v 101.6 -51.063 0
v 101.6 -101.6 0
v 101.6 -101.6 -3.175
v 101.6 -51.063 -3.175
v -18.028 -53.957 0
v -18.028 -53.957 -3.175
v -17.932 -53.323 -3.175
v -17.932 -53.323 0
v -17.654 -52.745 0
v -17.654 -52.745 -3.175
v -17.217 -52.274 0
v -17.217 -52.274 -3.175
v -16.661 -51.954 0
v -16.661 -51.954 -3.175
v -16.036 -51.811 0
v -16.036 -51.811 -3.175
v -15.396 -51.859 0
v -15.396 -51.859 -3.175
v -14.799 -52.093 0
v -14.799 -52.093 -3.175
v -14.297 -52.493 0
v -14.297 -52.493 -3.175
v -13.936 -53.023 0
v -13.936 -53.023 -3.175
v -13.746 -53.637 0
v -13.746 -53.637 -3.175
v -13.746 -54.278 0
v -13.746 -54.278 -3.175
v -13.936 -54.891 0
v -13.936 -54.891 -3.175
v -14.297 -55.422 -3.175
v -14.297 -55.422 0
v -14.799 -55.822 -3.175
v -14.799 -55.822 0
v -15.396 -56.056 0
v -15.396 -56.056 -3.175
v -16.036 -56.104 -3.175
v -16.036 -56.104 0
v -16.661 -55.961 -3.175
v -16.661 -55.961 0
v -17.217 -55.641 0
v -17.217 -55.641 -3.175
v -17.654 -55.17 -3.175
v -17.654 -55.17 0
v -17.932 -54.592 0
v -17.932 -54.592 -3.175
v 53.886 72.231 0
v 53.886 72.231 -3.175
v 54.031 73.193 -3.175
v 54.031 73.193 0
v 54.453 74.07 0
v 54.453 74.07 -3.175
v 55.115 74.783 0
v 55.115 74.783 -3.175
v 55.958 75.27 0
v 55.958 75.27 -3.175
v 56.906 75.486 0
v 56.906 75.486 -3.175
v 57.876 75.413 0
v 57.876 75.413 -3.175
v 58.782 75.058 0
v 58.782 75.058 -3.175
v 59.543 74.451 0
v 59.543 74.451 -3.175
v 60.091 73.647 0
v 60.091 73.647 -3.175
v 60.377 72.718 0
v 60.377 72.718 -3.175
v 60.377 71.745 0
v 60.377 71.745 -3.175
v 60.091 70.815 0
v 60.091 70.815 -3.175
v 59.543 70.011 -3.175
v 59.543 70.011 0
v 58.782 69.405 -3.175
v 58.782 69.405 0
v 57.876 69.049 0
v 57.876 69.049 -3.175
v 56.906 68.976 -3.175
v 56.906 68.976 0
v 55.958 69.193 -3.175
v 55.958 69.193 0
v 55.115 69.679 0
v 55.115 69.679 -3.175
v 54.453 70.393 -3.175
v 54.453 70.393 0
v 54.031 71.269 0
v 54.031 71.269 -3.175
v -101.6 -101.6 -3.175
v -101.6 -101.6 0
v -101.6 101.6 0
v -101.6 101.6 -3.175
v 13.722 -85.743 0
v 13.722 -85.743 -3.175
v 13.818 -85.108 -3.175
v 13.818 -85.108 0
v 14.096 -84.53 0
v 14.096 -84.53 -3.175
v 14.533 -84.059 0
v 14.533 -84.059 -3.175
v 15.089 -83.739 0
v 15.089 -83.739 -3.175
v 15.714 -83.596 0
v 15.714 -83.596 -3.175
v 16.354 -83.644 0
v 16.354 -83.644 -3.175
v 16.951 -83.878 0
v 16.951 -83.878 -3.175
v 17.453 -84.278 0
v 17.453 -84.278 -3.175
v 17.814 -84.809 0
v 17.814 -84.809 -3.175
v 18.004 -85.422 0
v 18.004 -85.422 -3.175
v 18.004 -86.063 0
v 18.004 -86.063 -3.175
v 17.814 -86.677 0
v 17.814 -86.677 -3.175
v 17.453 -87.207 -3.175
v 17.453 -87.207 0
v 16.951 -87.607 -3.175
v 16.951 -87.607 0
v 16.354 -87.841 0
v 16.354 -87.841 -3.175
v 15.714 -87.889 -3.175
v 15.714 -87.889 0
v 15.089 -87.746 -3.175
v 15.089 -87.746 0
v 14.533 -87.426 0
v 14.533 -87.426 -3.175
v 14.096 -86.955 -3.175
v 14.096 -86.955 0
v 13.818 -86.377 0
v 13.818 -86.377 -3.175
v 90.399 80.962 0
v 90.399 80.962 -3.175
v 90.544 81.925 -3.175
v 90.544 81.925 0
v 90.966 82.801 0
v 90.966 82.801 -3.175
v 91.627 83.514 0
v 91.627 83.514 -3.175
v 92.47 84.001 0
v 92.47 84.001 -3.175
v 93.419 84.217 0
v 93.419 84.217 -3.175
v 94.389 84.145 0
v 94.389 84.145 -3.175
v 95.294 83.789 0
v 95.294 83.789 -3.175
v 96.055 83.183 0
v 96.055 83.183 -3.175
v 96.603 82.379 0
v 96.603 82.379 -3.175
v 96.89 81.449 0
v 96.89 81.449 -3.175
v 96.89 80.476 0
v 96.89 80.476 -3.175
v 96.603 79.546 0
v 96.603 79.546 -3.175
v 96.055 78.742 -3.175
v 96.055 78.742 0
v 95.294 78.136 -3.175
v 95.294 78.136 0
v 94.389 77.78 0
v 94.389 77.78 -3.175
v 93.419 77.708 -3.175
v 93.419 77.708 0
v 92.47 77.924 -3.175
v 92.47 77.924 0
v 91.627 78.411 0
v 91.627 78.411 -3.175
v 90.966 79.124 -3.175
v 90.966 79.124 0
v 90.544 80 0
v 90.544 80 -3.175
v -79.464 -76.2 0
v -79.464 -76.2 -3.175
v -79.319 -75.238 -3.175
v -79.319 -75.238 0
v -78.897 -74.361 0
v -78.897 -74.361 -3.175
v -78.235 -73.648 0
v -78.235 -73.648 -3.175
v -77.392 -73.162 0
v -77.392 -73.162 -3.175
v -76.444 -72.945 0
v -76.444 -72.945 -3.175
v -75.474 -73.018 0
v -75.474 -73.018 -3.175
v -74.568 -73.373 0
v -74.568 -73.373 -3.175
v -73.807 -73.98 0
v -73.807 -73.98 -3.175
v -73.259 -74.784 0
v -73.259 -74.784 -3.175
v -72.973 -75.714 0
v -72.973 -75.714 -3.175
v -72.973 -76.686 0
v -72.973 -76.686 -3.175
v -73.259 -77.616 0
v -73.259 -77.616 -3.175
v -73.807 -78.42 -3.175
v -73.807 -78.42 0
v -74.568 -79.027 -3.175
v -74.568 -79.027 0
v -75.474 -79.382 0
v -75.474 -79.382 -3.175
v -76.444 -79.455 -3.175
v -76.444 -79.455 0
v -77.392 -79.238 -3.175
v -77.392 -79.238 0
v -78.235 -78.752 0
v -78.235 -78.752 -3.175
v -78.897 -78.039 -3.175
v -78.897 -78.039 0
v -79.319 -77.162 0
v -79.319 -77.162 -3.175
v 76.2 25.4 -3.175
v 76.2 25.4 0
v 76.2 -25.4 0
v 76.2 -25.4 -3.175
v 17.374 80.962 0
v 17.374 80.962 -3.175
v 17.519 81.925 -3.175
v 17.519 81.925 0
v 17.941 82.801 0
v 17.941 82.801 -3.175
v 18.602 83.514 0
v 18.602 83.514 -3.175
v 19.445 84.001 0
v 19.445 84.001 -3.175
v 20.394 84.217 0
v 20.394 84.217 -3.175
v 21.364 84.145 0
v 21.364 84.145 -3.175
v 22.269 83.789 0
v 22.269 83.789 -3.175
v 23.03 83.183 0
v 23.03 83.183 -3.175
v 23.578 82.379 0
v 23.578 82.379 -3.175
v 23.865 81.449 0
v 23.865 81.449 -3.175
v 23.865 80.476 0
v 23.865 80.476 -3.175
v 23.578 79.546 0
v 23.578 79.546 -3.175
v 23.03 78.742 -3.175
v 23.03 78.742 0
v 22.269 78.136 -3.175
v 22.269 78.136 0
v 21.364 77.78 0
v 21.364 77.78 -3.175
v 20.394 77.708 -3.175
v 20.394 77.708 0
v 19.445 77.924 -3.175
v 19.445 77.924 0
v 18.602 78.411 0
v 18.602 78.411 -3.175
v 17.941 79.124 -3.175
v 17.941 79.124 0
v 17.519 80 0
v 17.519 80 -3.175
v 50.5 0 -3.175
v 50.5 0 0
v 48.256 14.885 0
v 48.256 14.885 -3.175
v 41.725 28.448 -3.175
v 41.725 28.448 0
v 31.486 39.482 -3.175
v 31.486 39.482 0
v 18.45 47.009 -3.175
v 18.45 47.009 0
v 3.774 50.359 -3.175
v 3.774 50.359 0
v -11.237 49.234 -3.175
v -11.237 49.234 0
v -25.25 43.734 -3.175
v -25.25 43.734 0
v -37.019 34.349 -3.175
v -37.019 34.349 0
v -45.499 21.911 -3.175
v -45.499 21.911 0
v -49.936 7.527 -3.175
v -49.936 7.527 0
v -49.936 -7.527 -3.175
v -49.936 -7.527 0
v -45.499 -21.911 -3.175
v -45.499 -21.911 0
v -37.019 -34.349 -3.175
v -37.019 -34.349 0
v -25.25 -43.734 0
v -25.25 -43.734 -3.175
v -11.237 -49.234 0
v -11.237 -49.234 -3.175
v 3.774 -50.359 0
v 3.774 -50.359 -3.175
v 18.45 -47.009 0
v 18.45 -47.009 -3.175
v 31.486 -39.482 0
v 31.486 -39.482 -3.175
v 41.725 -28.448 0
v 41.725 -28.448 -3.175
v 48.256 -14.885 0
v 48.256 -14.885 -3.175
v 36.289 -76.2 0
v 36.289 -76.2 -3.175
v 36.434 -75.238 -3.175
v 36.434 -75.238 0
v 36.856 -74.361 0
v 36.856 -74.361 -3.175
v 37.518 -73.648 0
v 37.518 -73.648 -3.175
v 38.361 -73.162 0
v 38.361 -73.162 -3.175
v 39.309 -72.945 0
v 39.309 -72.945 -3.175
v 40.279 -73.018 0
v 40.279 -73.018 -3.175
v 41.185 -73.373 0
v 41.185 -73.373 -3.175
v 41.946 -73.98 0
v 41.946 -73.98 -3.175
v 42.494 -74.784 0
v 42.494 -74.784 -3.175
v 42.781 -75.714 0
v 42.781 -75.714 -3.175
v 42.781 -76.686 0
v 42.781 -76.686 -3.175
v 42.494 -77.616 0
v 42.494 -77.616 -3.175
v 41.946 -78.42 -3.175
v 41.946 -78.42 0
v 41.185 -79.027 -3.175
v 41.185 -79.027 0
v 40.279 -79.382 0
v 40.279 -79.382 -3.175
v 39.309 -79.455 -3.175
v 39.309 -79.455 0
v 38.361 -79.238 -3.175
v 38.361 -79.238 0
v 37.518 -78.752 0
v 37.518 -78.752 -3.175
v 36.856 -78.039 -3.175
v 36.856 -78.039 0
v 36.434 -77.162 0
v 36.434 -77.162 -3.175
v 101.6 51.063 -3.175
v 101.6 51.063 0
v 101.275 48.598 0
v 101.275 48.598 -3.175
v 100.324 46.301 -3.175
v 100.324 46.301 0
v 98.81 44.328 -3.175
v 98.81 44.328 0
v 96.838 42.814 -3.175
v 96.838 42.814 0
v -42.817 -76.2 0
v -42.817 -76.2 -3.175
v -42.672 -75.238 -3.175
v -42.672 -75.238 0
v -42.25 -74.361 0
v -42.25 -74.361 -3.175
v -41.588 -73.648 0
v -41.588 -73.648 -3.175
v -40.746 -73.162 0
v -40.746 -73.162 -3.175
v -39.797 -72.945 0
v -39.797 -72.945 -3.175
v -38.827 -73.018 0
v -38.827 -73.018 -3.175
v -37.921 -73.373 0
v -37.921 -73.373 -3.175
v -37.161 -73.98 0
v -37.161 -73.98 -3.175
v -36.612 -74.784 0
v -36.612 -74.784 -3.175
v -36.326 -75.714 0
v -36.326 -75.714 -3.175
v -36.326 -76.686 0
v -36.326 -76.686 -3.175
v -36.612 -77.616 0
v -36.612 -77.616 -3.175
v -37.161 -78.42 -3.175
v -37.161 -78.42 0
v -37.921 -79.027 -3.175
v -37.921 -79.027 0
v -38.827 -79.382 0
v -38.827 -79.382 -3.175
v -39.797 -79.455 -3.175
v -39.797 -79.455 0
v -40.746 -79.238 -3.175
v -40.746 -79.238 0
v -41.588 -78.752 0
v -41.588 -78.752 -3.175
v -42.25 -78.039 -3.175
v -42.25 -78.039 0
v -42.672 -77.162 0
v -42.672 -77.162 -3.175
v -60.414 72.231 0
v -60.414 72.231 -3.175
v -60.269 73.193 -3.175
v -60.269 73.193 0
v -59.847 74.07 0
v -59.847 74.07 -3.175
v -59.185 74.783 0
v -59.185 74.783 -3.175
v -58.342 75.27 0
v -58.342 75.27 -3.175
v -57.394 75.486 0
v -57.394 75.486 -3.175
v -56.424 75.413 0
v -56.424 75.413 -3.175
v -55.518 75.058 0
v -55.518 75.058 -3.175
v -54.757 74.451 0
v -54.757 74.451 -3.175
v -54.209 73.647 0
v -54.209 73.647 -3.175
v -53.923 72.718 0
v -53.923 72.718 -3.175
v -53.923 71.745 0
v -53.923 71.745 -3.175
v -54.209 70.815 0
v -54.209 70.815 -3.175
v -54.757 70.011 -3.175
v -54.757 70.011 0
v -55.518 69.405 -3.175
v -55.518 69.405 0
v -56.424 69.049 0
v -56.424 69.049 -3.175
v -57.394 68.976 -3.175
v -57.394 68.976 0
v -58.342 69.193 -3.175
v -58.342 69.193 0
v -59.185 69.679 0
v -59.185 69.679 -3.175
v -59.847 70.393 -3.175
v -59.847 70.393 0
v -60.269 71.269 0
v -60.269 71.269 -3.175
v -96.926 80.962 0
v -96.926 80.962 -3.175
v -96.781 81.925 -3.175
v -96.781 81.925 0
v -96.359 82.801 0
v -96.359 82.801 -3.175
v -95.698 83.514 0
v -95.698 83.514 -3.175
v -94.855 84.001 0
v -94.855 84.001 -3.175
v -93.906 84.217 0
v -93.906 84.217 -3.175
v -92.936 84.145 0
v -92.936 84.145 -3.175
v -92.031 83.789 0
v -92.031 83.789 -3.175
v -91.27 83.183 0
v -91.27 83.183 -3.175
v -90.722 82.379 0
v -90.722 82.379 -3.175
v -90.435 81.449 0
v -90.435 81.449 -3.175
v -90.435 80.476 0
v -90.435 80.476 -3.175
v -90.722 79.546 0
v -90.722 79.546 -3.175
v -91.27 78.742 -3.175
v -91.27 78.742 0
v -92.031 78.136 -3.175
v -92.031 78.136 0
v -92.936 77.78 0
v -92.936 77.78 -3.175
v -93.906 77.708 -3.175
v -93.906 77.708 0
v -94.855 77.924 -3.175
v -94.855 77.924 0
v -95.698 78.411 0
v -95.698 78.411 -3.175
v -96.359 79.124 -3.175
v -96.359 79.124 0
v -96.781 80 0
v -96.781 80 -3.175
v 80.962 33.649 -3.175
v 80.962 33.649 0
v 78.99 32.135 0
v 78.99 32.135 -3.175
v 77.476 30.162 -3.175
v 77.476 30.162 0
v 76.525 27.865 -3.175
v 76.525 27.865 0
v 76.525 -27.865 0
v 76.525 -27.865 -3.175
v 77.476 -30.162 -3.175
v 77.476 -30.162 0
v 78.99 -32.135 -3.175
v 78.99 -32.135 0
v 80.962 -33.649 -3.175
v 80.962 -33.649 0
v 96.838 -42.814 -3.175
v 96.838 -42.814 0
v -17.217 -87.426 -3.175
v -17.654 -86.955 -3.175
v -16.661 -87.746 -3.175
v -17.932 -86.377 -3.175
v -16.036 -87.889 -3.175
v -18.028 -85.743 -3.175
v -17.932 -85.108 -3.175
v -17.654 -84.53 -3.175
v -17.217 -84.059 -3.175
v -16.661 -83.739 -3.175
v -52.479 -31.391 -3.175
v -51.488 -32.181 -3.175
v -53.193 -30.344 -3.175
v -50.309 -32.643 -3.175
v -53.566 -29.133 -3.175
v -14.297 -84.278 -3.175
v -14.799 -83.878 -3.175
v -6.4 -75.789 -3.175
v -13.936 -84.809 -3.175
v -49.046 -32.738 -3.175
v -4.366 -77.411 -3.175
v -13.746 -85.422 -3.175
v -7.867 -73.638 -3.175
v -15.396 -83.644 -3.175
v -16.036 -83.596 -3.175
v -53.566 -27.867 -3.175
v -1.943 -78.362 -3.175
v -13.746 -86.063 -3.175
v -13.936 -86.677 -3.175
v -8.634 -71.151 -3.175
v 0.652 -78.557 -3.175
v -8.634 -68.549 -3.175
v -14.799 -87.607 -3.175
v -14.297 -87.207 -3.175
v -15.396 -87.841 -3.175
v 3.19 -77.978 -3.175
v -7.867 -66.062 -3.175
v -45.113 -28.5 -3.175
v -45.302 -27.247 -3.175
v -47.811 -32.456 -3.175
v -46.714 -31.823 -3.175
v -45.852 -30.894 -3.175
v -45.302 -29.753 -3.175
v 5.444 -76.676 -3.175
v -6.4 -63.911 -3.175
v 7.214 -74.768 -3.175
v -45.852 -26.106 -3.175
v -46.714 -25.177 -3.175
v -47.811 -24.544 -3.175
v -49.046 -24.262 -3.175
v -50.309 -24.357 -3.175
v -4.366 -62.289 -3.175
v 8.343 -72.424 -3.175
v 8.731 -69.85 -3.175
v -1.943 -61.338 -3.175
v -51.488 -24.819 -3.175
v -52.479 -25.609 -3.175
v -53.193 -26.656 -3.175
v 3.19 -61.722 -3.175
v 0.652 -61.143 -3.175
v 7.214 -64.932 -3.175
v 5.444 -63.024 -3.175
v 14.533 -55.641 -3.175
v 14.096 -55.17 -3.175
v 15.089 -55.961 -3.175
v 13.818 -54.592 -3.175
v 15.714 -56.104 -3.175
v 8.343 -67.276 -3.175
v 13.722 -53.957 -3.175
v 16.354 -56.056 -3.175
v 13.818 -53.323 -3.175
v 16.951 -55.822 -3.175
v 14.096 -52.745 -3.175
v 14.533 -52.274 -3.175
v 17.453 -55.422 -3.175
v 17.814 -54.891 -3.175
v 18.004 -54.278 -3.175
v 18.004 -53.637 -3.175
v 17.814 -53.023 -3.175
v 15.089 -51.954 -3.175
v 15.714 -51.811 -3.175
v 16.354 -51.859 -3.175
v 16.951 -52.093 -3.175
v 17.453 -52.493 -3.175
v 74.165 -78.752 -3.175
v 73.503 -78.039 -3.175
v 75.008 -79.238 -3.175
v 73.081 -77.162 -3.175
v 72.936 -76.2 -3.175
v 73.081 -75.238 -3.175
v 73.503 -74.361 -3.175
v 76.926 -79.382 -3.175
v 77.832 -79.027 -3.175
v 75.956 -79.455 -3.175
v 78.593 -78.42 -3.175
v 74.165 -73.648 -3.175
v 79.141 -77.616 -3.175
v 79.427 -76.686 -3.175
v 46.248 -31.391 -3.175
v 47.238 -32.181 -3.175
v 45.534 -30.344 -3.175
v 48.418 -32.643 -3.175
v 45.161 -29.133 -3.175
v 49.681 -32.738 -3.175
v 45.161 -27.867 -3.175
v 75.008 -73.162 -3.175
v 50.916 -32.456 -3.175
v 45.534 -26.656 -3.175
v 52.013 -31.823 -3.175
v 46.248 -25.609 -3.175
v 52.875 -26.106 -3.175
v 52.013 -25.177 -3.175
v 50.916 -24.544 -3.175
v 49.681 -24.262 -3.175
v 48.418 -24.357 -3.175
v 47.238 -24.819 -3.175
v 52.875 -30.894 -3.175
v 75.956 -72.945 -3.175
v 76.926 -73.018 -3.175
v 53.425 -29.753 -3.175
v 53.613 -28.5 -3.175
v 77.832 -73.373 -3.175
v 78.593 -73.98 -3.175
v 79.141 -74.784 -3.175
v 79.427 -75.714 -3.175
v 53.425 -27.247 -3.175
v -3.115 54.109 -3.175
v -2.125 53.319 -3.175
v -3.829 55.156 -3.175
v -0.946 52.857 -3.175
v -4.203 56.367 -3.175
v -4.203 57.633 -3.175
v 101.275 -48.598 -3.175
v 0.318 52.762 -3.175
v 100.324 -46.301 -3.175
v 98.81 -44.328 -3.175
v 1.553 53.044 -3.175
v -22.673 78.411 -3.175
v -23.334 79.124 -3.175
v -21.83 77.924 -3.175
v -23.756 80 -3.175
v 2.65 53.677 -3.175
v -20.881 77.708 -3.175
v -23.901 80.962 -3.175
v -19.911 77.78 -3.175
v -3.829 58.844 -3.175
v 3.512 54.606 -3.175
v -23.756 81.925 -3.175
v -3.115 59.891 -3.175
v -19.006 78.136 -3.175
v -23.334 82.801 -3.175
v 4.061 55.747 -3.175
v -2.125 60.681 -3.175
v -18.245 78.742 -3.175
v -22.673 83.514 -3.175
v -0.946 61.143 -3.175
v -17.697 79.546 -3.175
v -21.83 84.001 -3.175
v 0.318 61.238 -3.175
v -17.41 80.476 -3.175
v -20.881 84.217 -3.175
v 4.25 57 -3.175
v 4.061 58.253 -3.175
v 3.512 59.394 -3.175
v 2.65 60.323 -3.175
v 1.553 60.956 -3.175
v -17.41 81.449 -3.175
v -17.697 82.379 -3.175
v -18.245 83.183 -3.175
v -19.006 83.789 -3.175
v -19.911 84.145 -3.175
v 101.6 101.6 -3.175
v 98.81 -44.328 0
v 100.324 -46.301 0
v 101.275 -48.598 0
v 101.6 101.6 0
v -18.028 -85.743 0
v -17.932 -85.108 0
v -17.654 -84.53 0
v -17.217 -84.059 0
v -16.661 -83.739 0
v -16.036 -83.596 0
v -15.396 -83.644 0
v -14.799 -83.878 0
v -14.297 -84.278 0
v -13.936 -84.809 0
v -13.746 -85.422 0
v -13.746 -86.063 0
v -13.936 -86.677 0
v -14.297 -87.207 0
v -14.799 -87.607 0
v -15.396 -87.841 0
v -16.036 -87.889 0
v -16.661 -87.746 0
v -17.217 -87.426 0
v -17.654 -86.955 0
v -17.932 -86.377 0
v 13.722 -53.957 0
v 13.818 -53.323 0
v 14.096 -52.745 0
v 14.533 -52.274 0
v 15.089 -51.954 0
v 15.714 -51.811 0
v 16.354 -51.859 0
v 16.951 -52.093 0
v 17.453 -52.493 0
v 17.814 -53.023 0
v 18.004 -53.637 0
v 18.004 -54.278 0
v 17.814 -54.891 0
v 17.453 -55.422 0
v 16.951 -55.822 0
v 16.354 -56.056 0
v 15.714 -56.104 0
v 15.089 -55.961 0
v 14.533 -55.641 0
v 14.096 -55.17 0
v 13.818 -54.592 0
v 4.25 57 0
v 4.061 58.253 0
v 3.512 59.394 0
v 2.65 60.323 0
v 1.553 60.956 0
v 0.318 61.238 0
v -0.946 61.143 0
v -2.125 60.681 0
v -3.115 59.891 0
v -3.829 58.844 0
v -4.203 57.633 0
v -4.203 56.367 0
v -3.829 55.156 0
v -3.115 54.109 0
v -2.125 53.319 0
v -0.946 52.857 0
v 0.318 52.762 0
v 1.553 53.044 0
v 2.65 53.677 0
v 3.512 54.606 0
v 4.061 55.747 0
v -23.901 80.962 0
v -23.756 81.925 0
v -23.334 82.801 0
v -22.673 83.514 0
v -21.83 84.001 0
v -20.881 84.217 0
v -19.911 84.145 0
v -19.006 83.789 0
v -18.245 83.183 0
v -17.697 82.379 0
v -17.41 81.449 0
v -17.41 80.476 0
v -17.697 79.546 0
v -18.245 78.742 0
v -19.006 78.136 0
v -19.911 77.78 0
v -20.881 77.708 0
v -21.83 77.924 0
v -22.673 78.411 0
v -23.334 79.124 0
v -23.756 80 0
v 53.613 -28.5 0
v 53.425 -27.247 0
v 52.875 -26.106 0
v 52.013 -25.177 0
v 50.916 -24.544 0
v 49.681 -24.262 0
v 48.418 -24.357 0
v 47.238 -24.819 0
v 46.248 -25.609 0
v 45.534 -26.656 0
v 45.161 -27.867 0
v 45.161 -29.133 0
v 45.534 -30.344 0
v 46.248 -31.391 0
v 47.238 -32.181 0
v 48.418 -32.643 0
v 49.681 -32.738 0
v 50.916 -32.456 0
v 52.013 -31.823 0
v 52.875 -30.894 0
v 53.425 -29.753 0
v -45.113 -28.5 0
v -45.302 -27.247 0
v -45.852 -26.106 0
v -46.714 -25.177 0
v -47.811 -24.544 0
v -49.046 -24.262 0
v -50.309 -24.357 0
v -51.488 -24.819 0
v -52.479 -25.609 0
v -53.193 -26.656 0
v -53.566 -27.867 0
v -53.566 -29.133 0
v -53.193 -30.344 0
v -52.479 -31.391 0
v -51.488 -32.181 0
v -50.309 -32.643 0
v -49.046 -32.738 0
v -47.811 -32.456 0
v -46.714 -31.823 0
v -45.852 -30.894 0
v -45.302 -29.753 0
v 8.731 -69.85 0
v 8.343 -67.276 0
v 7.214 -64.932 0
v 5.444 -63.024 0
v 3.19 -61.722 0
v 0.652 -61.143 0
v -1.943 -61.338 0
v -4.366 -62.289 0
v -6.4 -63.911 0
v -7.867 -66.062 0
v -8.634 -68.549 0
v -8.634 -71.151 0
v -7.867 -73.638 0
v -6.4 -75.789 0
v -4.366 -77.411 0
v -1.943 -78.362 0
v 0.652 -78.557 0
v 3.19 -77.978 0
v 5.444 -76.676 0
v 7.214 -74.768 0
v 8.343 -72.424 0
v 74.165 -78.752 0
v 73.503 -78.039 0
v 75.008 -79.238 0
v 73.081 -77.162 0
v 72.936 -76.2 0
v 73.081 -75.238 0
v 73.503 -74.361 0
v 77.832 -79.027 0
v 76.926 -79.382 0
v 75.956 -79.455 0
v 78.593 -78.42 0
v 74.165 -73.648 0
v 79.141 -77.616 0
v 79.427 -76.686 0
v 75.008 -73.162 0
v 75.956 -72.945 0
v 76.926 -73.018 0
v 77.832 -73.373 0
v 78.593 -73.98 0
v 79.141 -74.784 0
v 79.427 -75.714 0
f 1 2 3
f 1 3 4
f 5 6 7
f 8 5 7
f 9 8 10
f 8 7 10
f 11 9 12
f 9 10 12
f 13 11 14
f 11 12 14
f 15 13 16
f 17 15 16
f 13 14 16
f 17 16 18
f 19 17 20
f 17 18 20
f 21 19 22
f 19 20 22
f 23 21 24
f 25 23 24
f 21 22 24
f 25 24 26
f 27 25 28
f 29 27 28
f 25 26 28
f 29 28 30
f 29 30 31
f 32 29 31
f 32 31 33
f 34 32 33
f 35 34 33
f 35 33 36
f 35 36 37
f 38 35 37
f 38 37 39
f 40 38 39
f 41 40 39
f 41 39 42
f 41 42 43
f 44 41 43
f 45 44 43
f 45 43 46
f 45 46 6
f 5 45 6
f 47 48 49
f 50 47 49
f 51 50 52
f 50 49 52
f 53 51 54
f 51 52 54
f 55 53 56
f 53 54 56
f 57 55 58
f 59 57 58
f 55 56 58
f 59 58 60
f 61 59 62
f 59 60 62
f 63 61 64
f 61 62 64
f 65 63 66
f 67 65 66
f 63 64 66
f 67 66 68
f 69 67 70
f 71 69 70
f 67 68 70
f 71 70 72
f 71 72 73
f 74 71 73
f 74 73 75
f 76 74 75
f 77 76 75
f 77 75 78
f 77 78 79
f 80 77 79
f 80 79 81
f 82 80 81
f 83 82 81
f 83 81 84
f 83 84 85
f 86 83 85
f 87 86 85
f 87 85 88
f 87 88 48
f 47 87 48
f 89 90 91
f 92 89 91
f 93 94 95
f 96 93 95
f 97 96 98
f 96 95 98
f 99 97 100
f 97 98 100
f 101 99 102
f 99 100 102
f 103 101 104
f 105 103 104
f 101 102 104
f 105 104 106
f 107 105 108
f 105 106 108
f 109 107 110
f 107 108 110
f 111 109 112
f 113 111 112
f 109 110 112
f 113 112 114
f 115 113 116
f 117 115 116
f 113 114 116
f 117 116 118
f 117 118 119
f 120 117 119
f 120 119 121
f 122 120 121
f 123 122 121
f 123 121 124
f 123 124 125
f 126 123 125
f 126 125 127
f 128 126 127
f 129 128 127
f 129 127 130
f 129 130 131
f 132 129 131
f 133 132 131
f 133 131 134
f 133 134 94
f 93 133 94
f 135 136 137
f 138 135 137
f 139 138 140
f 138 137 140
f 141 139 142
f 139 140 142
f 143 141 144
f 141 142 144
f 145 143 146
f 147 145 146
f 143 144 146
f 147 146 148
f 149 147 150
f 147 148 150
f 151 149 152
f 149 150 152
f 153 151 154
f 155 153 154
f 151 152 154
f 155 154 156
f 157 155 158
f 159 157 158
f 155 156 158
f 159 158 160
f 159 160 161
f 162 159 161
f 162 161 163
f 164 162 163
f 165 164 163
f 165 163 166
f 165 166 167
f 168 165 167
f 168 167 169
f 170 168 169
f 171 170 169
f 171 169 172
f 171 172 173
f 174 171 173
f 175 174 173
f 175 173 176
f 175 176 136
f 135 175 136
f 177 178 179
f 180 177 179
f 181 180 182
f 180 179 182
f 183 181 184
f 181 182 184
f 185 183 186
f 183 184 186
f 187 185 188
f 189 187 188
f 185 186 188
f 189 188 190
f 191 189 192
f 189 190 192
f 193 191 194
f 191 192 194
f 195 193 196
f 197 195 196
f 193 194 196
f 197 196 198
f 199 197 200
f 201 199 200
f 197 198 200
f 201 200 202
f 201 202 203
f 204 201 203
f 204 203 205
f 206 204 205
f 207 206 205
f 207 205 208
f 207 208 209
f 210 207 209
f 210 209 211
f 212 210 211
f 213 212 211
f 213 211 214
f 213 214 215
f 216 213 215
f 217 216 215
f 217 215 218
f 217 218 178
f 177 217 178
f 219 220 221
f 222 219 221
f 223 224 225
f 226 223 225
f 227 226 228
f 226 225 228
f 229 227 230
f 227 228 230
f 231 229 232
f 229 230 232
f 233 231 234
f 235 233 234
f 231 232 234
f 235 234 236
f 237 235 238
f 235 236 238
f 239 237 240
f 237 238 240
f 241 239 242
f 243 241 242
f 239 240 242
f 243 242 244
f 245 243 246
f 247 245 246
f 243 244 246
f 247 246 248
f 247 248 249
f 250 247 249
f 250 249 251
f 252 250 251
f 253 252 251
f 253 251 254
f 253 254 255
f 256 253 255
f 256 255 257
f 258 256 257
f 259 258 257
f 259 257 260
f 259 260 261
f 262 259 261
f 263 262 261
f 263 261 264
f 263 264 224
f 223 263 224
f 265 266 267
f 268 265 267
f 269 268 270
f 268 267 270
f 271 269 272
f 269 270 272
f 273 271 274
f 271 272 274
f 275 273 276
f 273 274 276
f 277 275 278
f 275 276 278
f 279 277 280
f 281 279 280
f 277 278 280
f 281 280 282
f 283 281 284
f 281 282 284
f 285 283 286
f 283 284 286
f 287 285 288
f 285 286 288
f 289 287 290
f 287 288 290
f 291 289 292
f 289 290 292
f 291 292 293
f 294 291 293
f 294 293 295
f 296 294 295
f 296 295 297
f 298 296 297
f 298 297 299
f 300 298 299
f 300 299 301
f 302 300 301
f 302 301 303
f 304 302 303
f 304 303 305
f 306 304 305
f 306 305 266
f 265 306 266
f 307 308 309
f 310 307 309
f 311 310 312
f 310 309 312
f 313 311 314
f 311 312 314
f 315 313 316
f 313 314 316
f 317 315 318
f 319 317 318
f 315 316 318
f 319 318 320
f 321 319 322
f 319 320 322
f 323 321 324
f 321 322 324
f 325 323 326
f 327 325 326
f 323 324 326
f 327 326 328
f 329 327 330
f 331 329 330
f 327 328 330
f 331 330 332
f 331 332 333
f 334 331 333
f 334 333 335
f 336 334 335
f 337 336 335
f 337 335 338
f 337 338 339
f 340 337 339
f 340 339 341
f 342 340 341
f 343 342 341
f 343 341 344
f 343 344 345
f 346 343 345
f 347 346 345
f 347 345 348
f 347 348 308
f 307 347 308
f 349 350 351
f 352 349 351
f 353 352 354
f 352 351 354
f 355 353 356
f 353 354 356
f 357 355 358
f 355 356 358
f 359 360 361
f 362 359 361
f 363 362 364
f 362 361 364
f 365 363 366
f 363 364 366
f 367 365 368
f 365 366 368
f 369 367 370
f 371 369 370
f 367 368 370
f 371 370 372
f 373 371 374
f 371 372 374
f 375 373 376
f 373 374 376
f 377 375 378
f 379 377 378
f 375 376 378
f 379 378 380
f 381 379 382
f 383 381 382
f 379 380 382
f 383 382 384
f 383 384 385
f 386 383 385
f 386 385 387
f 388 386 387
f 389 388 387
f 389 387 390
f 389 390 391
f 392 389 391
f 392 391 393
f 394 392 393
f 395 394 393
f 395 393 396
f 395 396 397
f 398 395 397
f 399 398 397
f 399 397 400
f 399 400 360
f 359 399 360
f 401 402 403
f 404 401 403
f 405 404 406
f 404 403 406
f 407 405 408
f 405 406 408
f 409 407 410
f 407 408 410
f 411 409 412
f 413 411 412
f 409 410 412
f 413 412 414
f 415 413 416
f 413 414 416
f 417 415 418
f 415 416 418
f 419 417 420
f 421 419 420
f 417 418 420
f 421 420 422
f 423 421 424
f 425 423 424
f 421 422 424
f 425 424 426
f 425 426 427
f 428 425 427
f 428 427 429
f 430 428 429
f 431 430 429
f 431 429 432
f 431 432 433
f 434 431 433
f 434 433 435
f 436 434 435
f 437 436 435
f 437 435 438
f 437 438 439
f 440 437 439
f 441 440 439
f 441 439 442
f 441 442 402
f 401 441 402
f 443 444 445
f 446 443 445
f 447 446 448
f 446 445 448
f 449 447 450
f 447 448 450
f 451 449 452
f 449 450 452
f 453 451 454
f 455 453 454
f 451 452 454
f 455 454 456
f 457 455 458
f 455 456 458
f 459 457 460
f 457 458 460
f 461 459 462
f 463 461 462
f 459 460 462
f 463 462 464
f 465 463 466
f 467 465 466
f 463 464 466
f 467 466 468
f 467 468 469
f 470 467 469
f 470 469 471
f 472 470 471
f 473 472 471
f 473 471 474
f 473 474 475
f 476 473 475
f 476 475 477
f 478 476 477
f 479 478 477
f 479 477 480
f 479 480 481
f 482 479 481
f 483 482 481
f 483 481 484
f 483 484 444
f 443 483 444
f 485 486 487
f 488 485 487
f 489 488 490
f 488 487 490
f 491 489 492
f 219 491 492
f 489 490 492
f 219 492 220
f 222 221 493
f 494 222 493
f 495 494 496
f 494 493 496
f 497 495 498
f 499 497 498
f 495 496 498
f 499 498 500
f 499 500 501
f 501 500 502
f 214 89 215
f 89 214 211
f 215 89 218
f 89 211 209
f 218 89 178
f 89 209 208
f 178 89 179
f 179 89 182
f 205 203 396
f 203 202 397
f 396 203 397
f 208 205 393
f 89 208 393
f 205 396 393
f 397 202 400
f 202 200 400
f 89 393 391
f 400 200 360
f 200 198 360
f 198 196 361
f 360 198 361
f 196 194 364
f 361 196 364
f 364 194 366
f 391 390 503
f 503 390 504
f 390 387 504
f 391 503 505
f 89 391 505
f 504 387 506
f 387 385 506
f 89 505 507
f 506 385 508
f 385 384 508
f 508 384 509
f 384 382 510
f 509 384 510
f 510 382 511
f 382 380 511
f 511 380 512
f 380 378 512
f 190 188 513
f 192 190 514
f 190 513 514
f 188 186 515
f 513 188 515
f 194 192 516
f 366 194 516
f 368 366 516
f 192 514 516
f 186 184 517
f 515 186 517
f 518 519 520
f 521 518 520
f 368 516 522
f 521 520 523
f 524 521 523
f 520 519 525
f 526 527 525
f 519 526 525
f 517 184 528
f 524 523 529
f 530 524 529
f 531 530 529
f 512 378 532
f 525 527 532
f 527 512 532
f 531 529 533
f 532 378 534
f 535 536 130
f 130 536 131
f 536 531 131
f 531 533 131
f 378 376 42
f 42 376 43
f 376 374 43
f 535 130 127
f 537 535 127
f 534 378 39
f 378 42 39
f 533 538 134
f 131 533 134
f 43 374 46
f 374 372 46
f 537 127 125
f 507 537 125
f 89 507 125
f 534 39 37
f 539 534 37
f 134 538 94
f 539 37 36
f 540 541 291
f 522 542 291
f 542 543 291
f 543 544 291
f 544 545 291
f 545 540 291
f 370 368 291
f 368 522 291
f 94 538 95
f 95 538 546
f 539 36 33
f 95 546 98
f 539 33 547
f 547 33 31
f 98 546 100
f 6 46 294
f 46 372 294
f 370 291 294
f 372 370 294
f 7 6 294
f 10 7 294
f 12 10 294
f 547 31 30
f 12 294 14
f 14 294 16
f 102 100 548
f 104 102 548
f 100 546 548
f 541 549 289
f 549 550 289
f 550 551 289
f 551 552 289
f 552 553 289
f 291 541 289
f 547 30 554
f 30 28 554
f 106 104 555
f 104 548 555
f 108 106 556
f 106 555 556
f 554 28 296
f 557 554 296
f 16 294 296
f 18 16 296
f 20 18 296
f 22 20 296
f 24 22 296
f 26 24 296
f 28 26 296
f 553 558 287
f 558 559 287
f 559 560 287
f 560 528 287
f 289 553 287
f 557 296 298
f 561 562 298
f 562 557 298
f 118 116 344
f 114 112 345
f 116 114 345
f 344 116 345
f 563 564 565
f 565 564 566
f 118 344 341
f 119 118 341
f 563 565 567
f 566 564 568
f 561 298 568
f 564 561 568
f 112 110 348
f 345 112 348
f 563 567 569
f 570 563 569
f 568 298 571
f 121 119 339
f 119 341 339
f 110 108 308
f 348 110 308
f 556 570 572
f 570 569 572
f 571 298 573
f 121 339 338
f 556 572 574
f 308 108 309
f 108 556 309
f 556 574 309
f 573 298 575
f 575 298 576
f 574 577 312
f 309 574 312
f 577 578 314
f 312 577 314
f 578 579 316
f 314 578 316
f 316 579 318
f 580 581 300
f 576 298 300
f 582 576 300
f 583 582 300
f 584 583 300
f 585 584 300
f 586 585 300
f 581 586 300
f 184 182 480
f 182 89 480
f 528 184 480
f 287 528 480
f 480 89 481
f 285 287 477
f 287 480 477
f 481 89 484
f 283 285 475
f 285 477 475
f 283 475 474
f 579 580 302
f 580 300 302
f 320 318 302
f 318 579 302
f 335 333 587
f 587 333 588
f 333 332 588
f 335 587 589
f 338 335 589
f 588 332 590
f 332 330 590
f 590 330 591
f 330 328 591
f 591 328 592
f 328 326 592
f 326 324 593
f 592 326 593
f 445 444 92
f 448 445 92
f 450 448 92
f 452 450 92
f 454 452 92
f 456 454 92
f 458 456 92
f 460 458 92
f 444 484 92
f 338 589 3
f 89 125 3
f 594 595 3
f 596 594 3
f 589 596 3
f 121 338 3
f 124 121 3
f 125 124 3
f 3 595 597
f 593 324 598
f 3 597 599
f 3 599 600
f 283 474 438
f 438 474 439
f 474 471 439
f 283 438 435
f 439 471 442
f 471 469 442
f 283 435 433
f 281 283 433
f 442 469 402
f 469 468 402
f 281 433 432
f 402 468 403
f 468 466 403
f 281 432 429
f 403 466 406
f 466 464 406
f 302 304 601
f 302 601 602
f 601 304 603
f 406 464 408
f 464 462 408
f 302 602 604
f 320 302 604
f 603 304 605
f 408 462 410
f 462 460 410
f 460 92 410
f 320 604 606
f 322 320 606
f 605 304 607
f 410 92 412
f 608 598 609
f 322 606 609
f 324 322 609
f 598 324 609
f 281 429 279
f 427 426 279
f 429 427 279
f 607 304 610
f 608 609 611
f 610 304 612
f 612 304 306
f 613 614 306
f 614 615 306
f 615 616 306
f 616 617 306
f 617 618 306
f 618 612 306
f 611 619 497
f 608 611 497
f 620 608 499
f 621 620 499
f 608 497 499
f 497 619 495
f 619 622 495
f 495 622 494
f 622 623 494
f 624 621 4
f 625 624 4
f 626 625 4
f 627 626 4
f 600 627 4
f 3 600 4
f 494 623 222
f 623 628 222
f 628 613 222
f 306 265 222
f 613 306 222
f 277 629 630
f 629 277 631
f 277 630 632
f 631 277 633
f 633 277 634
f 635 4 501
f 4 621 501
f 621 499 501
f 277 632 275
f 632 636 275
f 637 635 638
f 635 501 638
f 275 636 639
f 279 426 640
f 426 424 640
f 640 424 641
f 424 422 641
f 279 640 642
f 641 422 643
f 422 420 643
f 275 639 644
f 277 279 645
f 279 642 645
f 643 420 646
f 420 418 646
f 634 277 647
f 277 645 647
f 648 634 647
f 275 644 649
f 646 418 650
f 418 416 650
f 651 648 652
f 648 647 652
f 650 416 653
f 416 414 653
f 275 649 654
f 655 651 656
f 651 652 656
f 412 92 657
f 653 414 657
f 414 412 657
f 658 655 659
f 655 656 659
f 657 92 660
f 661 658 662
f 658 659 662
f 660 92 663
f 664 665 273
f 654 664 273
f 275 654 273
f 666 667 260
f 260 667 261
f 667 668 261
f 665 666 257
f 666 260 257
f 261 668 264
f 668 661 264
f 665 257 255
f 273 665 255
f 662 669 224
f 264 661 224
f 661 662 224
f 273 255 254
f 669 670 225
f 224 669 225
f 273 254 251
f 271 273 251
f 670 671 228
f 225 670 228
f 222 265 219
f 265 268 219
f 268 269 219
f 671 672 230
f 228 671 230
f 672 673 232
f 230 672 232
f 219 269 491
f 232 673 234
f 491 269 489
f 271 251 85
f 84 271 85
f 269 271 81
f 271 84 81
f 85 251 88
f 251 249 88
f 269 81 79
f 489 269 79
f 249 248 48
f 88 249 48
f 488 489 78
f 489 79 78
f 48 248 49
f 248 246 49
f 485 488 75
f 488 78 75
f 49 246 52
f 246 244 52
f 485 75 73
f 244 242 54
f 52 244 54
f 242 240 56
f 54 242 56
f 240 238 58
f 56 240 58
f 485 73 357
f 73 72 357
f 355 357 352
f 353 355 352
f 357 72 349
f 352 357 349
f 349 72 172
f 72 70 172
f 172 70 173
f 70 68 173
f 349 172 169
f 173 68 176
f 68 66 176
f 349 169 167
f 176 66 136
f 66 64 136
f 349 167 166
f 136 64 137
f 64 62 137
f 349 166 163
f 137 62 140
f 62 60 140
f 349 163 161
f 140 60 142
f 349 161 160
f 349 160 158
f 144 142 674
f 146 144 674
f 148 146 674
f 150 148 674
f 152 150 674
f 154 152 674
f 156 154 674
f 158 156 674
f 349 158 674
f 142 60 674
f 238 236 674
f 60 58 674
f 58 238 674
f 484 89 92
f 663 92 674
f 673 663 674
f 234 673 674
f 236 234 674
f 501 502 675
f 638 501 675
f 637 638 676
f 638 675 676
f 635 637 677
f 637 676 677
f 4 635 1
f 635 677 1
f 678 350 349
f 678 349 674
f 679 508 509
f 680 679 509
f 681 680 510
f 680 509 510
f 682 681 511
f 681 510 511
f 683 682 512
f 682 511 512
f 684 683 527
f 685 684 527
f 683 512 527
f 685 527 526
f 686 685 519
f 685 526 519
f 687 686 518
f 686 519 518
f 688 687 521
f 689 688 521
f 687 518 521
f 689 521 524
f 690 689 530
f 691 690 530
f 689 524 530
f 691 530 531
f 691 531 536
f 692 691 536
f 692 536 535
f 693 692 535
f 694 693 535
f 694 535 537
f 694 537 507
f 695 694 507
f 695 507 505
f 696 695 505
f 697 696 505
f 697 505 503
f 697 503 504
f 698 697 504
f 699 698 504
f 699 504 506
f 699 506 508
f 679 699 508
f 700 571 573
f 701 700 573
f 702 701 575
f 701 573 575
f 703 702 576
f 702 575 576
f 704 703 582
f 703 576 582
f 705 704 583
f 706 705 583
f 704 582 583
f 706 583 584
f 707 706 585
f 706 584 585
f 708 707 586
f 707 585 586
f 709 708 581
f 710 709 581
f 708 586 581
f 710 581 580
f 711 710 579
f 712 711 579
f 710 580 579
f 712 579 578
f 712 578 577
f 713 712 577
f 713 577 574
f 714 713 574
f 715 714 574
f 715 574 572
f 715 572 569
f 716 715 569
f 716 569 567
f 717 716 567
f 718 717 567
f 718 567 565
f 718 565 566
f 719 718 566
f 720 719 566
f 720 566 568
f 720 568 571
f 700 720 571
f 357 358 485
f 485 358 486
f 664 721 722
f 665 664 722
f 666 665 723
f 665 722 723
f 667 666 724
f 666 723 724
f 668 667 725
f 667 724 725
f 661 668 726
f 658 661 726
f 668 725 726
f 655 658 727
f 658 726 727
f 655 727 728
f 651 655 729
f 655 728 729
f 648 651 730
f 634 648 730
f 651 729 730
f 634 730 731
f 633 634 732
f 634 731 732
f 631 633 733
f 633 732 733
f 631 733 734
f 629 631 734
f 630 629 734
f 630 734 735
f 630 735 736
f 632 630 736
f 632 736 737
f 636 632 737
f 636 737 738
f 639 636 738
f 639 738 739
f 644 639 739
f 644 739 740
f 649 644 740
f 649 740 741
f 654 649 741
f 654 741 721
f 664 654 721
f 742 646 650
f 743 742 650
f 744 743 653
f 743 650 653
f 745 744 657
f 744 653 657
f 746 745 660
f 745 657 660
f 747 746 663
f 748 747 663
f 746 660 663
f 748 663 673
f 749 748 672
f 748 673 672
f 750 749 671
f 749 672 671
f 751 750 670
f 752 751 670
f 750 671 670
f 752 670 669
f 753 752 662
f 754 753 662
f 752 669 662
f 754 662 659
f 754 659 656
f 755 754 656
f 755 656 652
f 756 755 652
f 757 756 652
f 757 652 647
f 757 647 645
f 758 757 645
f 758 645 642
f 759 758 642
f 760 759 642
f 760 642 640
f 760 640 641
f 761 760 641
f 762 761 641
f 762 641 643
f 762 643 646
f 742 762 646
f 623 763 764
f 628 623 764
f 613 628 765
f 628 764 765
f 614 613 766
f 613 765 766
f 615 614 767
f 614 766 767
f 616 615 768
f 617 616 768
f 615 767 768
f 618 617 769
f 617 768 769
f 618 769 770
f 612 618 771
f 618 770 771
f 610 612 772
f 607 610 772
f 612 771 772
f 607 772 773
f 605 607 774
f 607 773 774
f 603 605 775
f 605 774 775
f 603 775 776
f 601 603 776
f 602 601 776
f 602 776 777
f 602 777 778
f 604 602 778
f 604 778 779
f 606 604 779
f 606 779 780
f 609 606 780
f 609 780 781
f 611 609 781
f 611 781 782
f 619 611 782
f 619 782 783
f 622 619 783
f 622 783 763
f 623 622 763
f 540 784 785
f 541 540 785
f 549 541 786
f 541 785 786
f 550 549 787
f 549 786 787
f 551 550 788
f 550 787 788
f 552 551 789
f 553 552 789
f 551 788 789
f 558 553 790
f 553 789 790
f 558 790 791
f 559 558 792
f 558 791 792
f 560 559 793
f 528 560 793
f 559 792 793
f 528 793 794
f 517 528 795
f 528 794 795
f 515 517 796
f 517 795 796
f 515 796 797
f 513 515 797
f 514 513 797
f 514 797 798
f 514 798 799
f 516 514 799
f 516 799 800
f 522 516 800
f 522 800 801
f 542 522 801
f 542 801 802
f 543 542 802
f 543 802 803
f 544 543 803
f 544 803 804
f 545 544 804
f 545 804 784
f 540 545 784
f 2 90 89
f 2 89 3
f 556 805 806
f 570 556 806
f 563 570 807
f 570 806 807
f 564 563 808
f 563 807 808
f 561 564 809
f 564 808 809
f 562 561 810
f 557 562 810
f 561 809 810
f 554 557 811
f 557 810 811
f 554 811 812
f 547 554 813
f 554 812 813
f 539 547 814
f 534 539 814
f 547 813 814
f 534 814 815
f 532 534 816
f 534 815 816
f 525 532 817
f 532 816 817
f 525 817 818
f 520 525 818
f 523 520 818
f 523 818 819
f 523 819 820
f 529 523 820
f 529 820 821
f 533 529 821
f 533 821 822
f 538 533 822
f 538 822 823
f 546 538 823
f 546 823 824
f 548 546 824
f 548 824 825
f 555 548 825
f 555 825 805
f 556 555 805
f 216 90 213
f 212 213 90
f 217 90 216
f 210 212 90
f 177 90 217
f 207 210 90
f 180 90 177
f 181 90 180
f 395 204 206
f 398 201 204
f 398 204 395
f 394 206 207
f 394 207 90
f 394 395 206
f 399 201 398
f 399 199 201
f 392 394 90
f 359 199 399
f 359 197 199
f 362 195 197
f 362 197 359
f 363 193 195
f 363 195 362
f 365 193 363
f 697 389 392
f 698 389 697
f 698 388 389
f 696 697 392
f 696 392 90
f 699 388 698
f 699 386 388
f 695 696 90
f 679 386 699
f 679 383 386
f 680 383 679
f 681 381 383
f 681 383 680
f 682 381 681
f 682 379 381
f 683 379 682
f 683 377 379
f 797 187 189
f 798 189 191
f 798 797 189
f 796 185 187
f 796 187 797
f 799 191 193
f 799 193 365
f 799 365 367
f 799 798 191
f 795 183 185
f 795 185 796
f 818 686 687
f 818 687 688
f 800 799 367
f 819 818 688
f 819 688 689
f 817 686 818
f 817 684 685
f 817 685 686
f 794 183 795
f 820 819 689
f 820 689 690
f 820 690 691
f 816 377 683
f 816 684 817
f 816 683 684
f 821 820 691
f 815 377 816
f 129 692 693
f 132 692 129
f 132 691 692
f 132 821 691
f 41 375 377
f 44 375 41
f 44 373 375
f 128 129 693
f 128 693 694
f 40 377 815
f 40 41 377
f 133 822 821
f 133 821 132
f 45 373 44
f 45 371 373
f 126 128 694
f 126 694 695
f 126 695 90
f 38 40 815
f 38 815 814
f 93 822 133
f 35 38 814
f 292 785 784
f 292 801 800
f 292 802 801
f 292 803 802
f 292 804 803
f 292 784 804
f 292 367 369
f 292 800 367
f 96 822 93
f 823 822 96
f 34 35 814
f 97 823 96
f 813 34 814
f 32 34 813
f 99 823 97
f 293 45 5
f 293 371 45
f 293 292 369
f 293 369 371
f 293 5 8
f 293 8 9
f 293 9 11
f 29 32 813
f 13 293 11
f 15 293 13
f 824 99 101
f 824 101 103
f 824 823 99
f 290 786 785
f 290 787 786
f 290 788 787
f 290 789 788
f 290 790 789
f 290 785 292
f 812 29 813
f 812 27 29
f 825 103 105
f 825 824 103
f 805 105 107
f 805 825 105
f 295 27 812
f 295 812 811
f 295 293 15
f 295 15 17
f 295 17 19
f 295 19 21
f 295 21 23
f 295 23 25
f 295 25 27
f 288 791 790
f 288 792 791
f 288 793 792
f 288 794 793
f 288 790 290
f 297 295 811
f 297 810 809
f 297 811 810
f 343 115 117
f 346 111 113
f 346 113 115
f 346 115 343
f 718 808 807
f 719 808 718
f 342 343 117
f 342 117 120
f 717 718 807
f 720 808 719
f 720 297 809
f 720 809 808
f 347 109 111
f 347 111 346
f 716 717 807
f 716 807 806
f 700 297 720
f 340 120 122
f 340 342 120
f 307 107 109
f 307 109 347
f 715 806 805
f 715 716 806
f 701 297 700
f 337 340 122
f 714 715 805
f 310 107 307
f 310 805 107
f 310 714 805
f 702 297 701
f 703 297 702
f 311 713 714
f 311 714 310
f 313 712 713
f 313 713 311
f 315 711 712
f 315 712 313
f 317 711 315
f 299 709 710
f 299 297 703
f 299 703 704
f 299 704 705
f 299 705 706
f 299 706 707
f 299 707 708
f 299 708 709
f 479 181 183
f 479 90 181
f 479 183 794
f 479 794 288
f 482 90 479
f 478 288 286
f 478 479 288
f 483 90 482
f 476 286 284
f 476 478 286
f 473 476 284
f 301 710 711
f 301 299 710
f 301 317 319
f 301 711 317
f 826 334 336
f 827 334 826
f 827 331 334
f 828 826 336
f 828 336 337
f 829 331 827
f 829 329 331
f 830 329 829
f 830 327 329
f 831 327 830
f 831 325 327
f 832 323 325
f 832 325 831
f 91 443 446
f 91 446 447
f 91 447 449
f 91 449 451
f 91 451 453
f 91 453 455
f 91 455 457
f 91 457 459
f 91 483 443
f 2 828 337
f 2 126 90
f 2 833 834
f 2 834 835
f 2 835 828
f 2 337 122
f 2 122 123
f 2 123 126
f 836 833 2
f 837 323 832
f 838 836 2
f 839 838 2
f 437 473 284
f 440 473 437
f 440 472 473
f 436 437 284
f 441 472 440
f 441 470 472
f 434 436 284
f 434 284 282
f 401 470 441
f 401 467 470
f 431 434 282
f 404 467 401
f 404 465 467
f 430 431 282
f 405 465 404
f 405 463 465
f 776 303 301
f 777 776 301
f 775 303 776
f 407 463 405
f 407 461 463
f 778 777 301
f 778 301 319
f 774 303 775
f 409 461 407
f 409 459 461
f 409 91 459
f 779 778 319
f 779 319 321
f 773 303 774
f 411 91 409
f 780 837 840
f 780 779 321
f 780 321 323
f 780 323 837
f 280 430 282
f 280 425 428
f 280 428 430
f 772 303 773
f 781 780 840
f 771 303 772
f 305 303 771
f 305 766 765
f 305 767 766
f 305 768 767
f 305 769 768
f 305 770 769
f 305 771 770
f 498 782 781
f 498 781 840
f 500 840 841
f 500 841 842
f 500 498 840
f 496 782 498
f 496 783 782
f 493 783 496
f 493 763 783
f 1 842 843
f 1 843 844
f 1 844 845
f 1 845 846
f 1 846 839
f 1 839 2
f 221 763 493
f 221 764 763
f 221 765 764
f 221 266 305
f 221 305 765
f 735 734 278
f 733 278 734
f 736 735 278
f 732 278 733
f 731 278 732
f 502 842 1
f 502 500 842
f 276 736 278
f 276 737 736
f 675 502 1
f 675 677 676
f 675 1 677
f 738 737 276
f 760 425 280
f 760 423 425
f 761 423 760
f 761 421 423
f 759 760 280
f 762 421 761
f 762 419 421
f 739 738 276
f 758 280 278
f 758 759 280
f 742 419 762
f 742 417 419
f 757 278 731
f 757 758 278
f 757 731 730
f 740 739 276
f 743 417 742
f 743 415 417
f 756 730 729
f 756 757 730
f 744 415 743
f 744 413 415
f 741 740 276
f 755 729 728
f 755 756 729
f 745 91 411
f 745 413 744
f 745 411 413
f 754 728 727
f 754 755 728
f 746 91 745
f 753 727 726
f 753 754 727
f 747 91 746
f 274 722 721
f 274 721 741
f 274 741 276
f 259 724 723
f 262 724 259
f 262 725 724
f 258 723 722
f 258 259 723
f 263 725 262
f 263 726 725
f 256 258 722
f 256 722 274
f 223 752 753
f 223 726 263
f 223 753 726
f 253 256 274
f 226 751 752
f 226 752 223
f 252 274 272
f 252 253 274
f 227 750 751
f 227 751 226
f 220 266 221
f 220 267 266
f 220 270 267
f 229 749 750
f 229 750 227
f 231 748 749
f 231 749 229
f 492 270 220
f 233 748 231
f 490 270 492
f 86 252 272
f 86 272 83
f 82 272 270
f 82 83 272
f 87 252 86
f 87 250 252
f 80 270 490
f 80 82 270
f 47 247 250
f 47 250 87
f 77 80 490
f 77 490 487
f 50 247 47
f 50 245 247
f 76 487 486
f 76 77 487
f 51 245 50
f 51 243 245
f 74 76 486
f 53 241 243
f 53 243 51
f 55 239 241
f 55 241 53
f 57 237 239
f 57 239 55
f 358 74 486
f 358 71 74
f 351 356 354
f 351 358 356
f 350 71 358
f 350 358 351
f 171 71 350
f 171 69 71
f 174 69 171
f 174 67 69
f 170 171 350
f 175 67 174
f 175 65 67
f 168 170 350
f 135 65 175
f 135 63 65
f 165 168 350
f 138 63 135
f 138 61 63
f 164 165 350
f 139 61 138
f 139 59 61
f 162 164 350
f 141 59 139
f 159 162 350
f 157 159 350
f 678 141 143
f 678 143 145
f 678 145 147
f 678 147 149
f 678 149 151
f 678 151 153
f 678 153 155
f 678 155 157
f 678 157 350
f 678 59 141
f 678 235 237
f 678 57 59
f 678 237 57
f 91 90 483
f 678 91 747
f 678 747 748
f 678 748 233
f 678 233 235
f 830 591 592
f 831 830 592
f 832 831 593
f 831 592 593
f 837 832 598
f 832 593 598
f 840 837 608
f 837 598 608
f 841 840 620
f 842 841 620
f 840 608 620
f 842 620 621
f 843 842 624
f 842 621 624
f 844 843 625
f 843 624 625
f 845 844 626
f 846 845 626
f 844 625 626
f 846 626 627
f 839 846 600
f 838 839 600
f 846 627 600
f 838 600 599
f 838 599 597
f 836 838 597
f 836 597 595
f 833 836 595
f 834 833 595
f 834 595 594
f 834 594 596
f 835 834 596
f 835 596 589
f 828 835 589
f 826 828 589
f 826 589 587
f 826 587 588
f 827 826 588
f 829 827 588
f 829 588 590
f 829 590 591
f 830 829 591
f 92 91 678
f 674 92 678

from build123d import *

# Parameters (mm, degrees)
SKETCH1_W               = 203.2
SKETCH1_H               = 203.2
BOSS_EXTRUDE1_DEPTH     = 3.175
SKETCH8_R               = 50.5
SKETCH8_R_2             = 4.25
CUT_EXTRUDE3_DEPTH      = 144.719172782
CUT_EXTRUDE4_DEPTH      = 144.719172782
F_1_4_CLEARANCE_HOLE2_D = 6.5278
F_1_4_CLEARANCE_HOLE1_D = 6.5278
F_8_CLEARANCE_HOLE2_D   = 4.3053
SKETCH19_R              = 8.73125
CUT_EXTRUDE5_DEPTH      = 144.719172782


with BuildPart() as part:
    # Sketch1 → Boss-Extrude1 (new body)
    with BuildSketch(Plane.XY):
        Rectangle(SKETCH1_W, SKETCH1_H)
    extrude(amount=-BOSS_EXTRUDE1_DEPTH)

    # Sketch8 → Cut-Extrude3 (cut, through all)
    with BuildSketch(Plane.XY):
        Circle(SKETCH8_R)
        with Locations((0, 57)):
            Circle(SKETCH8_R_2)
        with Locations((-49.363448016, -28.5)):
            Circle(SKETCH8_R_2)
        with Locations((49.363448016, -28.5)):
            Circle(SKETCH8_R_2)
    extrude(amount=-CUT_EXTRUDE3_DEPTH, mode=Mode.SUBTRACT)

    # Sketch10 → Cut-Extrude4 (cut, through all)
    with BuildSketch(Plane.XY):
        with BuildLine():
            Line((96.8375, 42.814327494), (80.9625, 33.648891971))
            ThreePointArc((80.9625, 33.648891971), (77.476108029, 30.1625), (76.2, 25.4))
            Line((76.2, 25.4), (76.2, -25.4))
            ThreePointArc((76.2, -25.4), (77.476108029, -30.1625), (80.9625, -33.648891971))
            Line((80.9625, -33.648891971), (96.8375, -42.814327494))
            ThreePointArc((96.8375, -42.814327494), (100.323891971, -46.300719465), (101.6, -51.063219465))
            Line((101.6, -51.063219465), (101.6, 51.063219465))
            ThreePointArc((101.6, 51.063219465), (100.323891971, 46.300719465), (96.8375, 42.814327494))
        make_face()
    extrude(amount=-CUT_EXTRUDE4_DEPTH, mode=Mode.SUBTRACT)

    # 1/4 Clearance Hole2 (through all)
    with Locations(Plane.XY):
        with Locations((76.2, -76.2), (39.553111932, -76.2), (-39.553111932, -76.2), (-76.2, -76.2)):
            Hole(F_1_4_CLEARANCE_HOLE2_D / 2)

    # 1/4 Clearance Hole1 (through all)
    with Locations(Plane.XY):
        with Locations((-93.6625, 80.9625), (-57.15, 72.23125), (-20.6375, 80.9625), (20.6375, 80.9625), (57.15, 72.23125), (93.6625, 80.9625)):
            Hole(F_1_4_CLEARANCE_HOLE1_D / 2)

    # #8 Clearance Hole2 (through all)
    with Locations(Plane.XY):
        with Locations((-15.874990337, -53.95749371), (15.874990337, -53.95749371), (-15.874990337, -85.74250629), (15.874990337, -85.74250629)):
            Hole(F_8_CLEARANCE_HOLE2_D / 2)

    # Sketch19 → Cut-Extrude5 (cut, through all)
    with BuildSketch(Plane.XY):
        with Locations((0, -69.85)):
            Circle(SKETCH19_R)
    extrude(amount=-CUT_EXTRUDE5_DEPTH, mode=Mode.SUBTRACT)


solid = part.part
